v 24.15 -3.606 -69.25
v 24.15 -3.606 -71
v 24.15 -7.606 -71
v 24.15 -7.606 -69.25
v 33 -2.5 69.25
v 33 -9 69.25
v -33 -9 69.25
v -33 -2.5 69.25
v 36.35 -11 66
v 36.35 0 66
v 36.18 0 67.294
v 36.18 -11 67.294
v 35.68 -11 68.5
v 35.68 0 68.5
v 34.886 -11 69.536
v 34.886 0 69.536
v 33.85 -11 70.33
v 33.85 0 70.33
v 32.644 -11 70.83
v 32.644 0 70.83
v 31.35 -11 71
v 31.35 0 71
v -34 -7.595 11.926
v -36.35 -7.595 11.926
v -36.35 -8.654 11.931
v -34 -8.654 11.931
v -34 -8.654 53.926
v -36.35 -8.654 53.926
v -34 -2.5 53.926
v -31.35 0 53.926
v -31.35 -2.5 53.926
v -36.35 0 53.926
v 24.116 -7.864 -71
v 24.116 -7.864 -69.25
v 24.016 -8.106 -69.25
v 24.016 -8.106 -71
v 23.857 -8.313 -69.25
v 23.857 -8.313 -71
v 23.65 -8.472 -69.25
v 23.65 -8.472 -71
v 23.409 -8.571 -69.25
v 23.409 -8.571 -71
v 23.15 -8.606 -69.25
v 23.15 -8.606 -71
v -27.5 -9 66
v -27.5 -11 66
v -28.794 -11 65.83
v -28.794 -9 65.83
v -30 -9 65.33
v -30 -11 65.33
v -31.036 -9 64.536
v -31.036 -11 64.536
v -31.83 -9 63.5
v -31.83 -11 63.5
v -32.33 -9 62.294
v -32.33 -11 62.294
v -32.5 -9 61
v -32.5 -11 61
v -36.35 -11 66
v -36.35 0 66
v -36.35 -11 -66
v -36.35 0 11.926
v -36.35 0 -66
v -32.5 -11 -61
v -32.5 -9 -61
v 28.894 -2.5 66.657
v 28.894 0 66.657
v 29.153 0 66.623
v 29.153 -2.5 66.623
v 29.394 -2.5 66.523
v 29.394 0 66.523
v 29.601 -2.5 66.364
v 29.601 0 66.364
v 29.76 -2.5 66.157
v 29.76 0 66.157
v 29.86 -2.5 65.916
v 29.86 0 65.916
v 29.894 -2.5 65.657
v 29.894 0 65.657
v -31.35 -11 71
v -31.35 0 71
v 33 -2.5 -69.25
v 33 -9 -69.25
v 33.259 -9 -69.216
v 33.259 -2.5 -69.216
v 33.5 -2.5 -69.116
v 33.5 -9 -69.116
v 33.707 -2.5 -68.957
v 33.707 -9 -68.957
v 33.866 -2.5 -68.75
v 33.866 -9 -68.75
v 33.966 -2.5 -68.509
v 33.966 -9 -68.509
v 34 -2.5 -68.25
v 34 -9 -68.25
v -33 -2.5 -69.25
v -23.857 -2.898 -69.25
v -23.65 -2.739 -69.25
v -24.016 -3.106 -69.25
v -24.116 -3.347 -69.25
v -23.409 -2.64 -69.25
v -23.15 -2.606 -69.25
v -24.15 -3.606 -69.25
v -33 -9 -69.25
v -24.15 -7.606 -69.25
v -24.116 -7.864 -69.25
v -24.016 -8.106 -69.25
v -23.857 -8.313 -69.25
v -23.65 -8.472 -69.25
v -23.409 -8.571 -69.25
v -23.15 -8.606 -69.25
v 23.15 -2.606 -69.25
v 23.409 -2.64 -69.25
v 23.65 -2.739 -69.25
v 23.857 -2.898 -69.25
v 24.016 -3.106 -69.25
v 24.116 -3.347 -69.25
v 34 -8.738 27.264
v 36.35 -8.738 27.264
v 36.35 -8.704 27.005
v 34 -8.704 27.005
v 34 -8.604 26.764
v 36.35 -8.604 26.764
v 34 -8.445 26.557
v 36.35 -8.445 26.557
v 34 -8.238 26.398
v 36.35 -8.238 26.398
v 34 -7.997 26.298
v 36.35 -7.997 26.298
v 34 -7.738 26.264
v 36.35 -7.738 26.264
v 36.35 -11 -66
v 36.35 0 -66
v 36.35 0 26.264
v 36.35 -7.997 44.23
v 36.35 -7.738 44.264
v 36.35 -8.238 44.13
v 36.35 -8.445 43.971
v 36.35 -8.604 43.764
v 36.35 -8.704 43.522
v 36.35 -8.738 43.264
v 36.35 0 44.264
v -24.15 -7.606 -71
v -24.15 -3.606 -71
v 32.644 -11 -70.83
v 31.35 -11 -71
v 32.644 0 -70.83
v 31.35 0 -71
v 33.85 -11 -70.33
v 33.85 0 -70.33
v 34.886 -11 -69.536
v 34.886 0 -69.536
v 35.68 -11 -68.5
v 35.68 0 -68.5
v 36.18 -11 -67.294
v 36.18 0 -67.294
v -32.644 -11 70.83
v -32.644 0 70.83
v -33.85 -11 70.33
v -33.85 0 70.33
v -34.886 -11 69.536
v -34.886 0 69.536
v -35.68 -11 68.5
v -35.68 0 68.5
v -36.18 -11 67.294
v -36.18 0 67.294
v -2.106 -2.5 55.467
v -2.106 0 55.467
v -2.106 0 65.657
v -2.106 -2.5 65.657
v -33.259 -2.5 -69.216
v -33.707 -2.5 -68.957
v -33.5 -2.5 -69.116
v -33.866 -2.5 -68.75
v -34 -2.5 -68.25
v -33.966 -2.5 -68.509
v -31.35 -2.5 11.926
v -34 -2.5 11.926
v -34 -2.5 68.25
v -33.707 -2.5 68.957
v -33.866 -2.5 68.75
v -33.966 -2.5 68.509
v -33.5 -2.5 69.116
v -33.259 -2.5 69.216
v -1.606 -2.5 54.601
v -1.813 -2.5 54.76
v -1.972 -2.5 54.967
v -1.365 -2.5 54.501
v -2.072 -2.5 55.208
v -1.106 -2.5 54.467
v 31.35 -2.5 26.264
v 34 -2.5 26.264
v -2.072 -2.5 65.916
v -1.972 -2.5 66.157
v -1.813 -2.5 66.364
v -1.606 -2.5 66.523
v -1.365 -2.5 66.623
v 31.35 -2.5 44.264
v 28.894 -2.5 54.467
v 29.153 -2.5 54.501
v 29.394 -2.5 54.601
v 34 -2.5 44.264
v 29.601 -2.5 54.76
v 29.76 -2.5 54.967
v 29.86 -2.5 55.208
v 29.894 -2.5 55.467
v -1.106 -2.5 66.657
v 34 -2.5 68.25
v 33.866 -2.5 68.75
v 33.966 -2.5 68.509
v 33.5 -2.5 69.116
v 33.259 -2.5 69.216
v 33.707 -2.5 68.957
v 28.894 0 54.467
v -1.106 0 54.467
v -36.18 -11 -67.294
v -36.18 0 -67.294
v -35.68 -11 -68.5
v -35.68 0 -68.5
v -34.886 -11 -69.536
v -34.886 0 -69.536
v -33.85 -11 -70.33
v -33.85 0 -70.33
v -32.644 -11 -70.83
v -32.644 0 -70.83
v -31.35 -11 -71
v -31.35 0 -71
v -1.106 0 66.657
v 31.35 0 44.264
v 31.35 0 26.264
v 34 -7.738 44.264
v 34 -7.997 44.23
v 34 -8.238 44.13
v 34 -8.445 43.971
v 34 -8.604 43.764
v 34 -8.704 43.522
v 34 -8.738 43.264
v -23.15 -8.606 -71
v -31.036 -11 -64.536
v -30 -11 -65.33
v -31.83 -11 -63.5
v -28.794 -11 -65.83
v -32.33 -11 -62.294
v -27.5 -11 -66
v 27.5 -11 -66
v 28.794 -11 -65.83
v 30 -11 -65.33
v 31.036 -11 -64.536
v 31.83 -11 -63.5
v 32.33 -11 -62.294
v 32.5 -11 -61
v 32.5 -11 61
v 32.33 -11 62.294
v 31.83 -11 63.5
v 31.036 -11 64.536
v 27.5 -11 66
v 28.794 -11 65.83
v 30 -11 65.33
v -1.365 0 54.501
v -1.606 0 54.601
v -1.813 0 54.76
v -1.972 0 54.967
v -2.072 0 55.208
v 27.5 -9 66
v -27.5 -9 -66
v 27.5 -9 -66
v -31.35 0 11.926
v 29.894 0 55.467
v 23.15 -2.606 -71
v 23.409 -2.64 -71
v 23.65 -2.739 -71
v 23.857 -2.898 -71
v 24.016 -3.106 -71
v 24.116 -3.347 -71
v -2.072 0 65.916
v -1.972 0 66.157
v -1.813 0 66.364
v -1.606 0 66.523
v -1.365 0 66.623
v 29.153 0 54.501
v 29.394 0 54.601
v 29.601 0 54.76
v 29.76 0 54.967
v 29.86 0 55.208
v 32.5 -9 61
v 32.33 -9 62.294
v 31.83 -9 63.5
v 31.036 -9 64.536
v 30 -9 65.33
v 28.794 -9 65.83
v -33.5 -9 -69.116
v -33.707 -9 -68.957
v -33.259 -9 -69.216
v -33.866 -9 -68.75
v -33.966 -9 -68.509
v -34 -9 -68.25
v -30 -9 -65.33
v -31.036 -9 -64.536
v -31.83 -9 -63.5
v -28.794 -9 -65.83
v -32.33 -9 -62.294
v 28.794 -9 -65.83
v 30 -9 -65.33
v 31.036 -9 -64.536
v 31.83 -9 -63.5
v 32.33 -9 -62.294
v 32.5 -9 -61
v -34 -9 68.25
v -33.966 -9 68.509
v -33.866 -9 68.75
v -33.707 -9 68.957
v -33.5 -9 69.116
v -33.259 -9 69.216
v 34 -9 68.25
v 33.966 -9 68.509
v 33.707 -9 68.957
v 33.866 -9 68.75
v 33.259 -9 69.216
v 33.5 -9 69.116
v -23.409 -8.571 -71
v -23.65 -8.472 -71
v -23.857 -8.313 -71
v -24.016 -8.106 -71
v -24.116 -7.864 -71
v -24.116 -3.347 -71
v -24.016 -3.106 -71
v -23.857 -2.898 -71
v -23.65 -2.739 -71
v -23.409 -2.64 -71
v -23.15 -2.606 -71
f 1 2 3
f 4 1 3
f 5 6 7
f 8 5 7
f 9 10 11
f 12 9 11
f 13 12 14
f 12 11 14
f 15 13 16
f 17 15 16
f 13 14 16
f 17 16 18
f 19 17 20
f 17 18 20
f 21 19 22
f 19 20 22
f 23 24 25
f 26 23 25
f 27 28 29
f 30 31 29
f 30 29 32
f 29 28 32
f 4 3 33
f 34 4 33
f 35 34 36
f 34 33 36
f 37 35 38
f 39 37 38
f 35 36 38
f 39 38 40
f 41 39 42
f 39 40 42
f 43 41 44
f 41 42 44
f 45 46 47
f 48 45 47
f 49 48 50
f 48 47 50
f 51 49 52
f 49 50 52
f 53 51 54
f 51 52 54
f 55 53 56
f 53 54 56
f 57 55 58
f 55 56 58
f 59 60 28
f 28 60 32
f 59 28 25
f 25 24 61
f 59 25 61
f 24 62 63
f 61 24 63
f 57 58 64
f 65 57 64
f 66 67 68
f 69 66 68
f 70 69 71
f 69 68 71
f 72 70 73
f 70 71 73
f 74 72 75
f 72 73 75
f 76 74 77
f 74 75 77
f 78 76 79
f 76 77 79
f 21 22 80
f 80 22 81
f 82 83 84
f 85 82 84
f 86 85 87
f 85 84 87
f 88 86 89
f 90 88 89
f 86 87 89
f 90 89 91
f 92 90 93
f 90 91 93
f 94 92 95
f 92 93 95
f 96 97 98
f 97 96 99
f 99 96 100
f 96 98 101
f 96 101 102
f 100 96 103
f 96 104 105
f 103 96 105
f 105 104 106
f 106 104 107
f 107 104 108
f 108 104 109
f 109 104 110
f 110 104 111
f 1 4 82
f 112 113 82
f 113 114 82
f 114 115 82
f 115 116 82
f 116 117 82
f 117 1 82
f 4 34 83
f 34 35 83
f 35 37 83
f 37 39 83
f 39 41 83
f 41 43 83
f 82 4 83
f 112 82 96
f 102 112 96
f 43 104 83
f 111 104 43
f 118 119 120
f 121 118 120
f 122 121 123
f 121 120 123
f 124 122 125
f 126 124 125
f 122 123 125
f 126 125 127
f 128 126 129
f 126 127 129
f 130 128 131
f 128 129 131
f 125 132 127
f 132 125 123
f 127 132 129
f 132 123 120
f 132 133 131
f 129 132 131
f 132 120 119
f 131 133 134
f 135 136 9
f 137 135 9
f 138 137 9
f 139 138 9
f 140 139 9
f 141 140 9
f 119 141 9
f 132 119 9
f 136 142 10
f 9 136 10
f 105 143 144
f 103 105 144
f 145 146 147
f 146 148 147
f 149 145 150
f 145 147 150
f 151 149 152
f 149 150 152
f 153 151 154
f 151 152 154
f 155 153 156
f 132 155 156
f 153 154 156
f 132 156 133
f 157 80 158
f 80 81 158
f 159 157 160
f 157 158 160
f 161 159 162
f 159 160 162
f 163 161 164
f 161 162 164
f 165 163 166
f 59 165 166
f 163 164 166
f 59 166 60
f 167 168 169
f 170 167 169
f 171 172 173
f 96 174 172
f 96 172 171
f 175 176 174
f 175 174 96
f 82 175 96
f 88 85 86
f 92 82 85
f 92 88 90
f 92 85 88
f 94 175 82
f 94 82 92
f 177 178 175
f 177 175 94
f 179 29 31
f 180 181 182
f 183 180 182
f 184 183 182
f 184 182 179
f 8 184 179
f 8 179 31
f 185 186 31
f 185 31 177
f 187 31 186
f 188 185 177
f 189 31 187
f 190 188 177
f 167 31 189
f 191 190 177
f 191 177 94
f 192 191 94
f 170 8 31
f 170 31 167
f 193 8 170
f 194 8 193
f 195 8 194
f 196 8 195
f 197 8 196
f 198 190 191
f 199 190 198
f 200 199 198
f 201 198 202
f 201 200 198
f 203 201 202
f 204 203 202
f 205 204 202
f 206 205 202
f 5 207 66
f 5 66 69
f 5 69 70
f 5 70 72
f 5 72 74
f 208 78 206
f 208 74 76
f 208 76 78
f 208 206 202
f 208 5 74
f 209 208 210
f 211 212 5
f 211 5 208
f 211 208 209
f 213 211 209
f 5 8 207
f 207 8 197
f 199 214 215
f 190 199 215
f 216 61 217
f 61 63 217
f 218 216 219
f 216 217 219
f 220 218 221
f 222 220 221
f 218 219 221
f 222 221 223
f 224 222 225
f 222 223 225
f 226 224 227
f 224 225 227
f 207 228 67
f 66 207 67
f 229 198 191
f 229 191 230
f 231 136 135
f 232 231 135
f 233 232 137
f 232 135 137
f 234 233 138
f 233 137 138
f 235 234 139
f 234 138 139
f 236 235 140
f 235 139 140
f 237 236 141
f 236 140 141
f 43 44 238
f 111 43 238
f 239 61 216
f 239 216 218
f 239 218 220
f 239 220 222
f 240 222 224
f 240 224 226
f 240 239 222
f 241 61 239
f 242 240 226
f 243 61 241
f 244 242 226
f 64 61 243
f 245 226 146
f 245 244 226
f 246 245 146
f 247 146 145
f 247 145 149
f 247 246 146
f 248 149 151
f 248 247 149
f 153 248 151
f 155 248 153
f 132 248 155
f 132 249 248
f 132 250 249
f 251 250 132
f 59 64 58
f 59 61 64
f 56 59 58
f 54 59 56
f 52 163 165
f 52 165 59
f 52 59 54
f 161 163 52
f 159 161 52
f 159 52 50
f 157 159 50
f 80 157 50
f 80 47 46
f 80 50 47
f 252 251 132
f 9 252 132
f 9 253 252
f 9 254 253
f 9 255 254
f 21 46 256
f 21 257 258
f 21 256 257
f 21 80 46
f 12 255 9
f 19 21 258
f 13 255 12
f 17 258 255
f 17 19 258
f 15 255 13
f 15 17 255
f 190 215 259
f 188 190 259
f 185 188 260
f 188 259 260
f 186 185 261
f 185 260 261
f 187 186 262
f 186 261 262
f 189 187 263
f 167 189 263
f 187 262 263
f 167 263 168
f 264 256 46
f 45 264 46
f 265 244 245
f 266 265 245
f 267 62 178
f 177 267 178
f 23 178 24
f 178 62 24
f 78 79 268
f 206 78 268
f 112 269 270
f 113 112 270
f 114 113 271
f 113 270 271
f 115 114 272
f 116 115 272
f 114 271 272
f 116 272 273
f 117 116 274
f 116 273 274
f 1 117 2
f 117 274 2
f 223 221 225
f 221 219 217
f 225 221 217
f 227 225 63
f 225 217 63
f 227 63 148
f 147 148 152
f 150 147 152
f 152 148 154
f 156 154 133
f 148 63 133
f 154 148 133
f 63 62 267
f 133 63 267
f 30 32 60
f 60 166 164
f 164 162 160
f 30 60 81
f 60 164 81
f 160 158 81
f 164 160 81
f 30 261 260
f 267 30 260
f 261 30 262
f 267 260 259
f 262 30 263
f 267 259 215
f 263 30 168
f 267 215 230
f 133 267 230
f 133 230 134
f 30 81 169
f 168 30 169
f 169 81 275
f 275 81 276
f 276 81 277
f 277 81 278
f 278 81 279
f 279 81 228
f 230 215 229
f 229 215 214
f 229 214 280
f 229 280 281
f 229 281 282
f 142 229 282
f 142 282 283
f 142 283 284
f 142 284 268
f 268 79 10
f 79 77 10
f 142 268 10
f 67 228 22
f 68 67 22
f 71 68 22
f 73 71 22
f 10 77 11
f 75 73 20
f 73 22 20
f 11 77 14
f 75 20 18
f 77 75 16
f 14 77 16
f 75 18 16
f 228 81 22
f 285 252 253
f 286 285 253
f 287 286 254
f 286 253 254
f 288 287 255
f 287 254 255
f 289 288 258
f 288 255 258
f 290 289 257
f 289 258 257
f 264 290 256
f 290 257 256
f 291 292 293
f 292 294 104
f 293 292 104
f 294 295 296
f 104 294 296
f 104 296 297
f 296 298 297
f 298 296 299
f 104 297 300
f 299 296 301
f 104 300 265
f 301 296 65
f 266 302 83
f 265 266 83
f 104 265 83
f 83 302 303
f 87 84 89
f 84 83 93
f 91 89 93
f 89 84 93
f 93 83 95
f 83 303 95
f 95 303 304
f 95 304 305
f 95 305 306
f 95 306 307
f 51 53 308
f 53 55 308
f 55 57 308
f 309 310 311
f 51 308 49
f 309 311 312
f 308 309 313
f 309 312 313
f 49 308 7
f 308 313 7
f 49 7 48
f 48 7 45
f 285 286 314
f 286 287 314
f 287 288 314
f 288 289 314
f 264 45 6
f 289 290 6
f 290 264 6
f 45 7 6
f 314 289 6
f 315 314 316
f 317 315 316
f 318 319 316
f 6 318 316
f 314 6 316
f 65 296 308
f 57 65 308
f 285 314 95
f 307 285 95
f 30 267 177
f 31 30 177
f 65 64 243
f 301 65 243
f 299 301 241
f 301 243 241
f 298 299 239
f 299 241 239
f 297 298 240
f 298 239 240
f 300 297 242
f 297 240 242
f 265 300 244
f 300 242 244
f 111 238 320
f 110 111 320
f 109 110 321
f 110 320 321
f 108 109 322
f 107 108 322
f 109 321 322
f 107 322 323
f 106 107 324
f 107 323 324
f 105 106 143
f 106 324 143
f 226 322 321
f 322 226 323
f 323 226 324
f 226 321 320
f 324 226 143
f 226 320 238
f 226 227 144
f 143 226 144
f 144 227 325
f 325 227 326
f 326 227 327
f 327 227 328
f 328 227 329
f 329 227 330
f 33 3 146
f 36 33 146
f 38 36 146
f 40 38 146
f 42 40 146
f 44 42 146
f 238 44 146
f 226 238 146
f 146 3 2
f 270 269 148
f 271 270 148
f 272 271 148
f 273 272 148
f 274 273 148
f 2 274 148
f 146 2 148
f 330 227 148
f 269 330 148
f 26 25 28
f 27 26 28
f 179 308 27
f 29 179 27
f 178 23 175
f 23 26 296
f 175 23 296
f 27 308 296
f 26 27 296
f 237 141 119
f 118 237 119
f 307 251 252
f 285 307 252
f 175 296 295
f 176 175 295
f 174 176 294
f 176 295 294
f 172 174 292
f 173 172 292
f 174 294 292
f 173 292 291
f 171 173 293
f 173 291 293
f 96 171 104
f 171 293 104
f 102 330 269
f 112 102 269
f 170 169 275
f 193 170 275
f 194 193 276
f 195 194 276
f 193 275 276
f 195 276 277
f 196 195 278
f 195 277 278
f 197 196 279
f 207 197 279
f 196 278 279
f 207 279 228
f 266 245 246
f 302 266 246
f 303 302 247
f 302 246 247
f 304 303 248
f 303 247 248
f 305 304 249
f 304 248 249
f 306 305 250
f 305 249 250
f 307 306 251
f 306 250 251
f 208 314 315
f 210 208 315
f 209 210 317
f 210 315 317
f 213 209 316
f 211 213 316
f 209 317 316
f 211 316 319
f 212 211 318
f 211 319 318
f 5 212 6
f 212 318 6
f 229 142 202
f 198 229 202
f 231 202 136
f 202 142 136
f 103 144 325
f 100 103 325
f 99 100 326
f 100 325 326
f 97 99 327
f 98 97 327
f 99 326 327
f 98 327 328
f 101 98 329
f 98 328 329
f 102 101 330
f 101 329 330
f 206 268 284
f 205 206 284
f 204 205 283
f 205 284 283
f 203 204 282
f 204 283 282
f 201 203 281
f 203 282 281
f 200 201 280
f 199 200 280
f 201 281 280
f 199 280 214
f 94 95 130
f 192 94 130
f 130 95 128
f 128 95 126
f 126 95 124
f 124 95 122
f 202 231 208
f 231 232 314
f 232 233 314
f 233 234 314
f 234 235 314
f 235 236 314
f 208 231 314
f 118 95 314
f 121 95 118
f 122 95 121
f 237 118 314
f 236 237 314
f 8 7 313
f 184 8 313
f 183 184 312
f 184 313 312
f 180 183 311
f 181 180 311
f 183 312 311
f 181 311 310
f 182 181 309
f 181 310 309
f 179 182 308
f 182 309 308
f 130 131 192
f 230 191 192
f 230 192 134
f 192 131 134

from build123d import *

# Parameters (mm, degrees)
F1_DEPTH  = 9
F3_DEPTH  = 6.5
F5_DEPTH  = 5
F7_DEPTH  = 5
F9_DEPTH  = 11.3
F11_DEPTH = 3
F13_DEPTH = 2
F15_DEPTH = 2


with BuildPart() as f1:
    # F0 (on Front) → F1 (new body)
    with BuildSketch(Plane.XZ):
        with BuildLine():
            Line((31.35, 71), (-31.35, 71))
            ThreePointArc((-31.35, 71), (-34.8855339059, 69.5355339059), (-36.35, 66))
            Line((-36.35, 66), (-36.35, -66))
            ThreePointArc((-36.35, -66), (-34.8855339059, -69.5355339059), (-31.35, -71))
            Line((-31.35, -71), (31.35, -71))
            ThreePointArc((31.35, -71), (34.8855339059, -69.5355339059), (36.35, -66))
            Line((36.35, -66), (36.35, 66))
            ThreePointArc((36.35, 66), (34.8855339059, 69.5355339059), (31.35, 71))
        make_face()
    extrude(amount=F1_DEPTH)

    # F2 (on face) → F3 (cut)
    with BuildSketch(Plane.XZ.offset(9)):
        with BuildLine():
            Line((33, 69.25), (-33, 69.25))
            ThreePointArc((-33, 69.25), (-33.7071067812, 68.9571067812), (-34, 68.25))
            Line((-34, 68.25), (-34, -68.25))
            ThreePointArc((-34, -68.25), (-33.7071067812, -68.9571067812), (-33, -69.25))
            Line((-33, -69.25), (33, -69.25))
            ThreePointArc((33, -69.25), (33.7071067812, -68.9571067812), (34, -68.25))
            Line((34, -68.25), (34, 68.25))
            ThreePointArc((34, 68.25), (33.7071067812, 68.9571067812), (33, 69.25))
        make_face()
    extrude(amount=-F3_DEPTH, mode=Mode.SUBTRACT)

    # F4 (on face) → F5 (cut)
    with BuildSketch(Plane.YZ.offset(36.35)):
        with BuildLine():
            Line((-4.6452410497, 26.2636251819), (-2.8310960583, 26.2636251819))
            Line((-2.8310960583, 26.2636251819), (0, 26.2636251819))
            Line((0, 26.2636251819), (0, 44.2636251819))
            Line((0, 44.2636251819), (-1.15, 44.2636251819))
            Line((-1.15, 44.2636251819), (-6.238168554, 44.2636251819))
            Line((-6.238168554, 44.2636251819), (-6.326337108, 44.2636251819))
            Line((-6.326337108, 44.2636251819), (-7.738168554, 44.2636251819))
            ThreePointArc((-7.738168554, 44.2636251819), (-8.4452753352, 43.9707319631), (-8.738168554, 43.2636251819))
            Line((-8.738168554, 43.2636251819), (-8.738168554, 27.2636251819))
            ThreePointArc((-8.738168554, 27.2636251819), (-8.4452753352, 26.5565184007), (-7.738168554, 26.2636251819))
            Line((-7.738168554, 26.2636251819), (-4.6452410497, 26.2636251819))
        make_face()
        with BuildLine():
            Line((0, 44.2636251819), (0, 26.2636251819))
            Line((0, 26.2636251819), (0.261831446, 26.2636251819))
            ThreePointArc((0.261831446, 26.2636251819), (0.9689382272, 26.5565184007), (1.261831446, 27.2636251819))
            Line((1.261831446, 27.2636251819), (1.261831446, 43.2636251819))
            ThreePointArc((1.261831446, 43.2636251819), (0.9689382272, 43.9707319631), (0.261831446, 44.2636251819))
            Line((0.261831446, 44.2636251819), (0, 44.2636251819))
        make_face()
    extrude(amount=-F5_DEPTH, mode=Mode.SUBTRACT)

    # F6 (on face) → F7 (cut)
    with BuildSketch(Plane(origin=(-36.35, 0, 0), x_dir=(0, -1, 0), z_dir=(-1, 0, 0))):
        Polygon((0, 53.926020956), (0, 11.926020956), (1.3606869444, 11.926020956), (5.3289291725, 11.926020956), (7.5948080584, 11.926020956), (8.6544789374, 11.9307097048), (8.6544789374, 53.926020956), (6.6106869444, 53.926020956), (5.3289291725, 53.926020956), (1.3606869444, 53.926020956), align=None)
        with BuildLine():
            ThreePointArc((-5.1551919416, 12.926020956), (-4.8622987227, 12.2189141749), (-4.1551919416, 11.926020956))
            Line((-4.1551919416, 11.926020956), (0, 11.926020956))
            Line((0, 11.926020956), (0, 53.926020956))
            Line((0, 53.926020956), (-4.2237708107, 53.926020956))
            ThreePointArc((-4.2237708107, 53.926020956), (-4.9107913061, 53.5846351538), (-5.1551919416, 52.8574420869))
            Line((-5.1551919416, 52.8574420869), (-5.1551919416, 12.926020956))
        make_face()
    extrude(amount=-F7_DEPTH, mode=Mode.SUBTRACT)

    # F8 (on face) → F9 (cut)
    with BuildSketch(Plane(origin=(0, 0, -71), x_dir=(1, 0, 0), z_dir=(0, 0, -1))):
        with BuildLine():
            Line((-23.15, 2.6055127643), (23.15, 2.6055127643))
            ThreePointArc((23.15, 2.6055127643), (23.8571067812, 2.8984059831), (24.15, 3.6055127643))
            Line((24.15, 3.6055127643), (24.15, 5.5759565953))
            Line((24.15, 5.5759565953), (-24.15, 5.6350689333))
            Line((-24.15, 5.6350689333), (-24.15, 3.6055127643))
            ThreePointArc((-24.15, 3.6055127643), (-23.8571067812, 2.8984059831), (-23.15, 2.6055127643))
        make_face()
        with BuildLine():
            Line((-24.15, 5.6350689333), (24.15, 5.5759565953))
            Line((24.15, 5.5759565953), (24.15, 7.6055127643))
            ThreePointArc((24.15, 7.6055127643), (23.8571067812, 8.3126195455), (23.15, 8.6055127643))
            Line((23.15, 8.6055127643), (-23.15, 8.6055127643))
            ThreePointArc((-23.15, 8.6055127643), (-23.8571067812, 8.3126195455), (-24.15, 7.6055127643))
            Line((-24.15, 7.6055127643), (-24.15, 5.6350689333))
        make_face()
    extrude(amount=-F9_DEPTH, mode=Mode.SUBTRACT)

    # F10 (on face) → F11 (cut)
    with BuildSketch(Plane(origin=(0, 0, 0), x_dir=(-1, 0, 0), z_dir=(0, 1, 0))):
        with BuildLine():
            ThreePointArc((-29.8940427601, 55.4671416283), (-29.6011495413, 54.7600348471), (-28.8940427601, 54.4671416283))
            Line((-28.8940427601, 54.4671416283), (1.1059572399, 54.4671416283))
            ThreePointArc((1.1059572399, 54.4671416283), (1.8130640211, 54.7600348471), (2.1059572399, 55.4671416283))
            Line((2.1059572399, 55.4671416283), (2.1059572399, 65.6569396853))
            ThreePointArc((2.1059572399, 65.6569396853), (1.8130640211, 66.3640464665), (1.1059572399, 66.6569396853))
            Line((1.1059572399, 66.6569396853), (-28.8940427601, 66.6569396853))
            ThreePointArc((-28.8940427601, 66.6569396853), (-29.6011495413, 66.3640464665), (-29.8940427601, 65.6569396853))
            Line((-29.8940427601, 65.6569396853), (-29.8940427601, 55.4671416283))
        make_face()
    extrude(amount=-F11_DEPTH, mode=Mode.SUBTRACT)

    # F12 (on face) → F13 (join)
    with BuildSketch(Plane.XZ.offset(9)):
        with BuildLine():
            Line((31.35, 71), (-31.35, 71))
            ThreePointArc((-31.35, 71), (-34.8855339059, 69.5355339059), (-36.35, 66))
            Line((-36.35, 66), (-36.35, -66))
            ThreePointArc((-36.35, -66), (-34.8855339059, -69.5355339059), (-31.35, -71))
            Line((-31.35, -71), (31.35, -71))
            ThreePointArc((31.35, -71), (34.8855339059, -69.5355339059), (36.35, -66))
            Line((36.35, -66), (36.35, 66))
            ThreePointArc((36.35, 66), (34.8855339059, 69.5355339059), (31.35, 71))
        make_face()
    extrude(amount=F13_DEPTH)

    # F14 (on face) → F15 (cut)
    with BuildSketch(Plane.XZ.offset(11)):
        with BuildLine():
            Line((27.5, 66), (-23.9265979081, 66))
            Line((-23.9265979081, 66), (-27.5, 66))
            ThreePointArc((-27.5, 66), (-31.0355339059, 64.5355339059), (-32.5, 61))
            Line((-32.5, 61), (-32.5, -61))
            ThreePointArc((-32.5, -61), (-31.0355339059, -64.5355339059), (-27.5, -66))
            Line((-27.5, -66), (27.5, -66))
            ThreePointArc((27.5, -66), (31.0355339059, -64.5355339059), (32.5, -61))
            Line((32.5, -61), (32.5, 61))
            ThreePointArc((32.5, 61), (31.0355339059, 64.5355339059), (27.5, 66))
        make_face()
    extrude(amount=-F15_DEPTH, mode=Mode.SUBTRACT)


solid = f1.part
